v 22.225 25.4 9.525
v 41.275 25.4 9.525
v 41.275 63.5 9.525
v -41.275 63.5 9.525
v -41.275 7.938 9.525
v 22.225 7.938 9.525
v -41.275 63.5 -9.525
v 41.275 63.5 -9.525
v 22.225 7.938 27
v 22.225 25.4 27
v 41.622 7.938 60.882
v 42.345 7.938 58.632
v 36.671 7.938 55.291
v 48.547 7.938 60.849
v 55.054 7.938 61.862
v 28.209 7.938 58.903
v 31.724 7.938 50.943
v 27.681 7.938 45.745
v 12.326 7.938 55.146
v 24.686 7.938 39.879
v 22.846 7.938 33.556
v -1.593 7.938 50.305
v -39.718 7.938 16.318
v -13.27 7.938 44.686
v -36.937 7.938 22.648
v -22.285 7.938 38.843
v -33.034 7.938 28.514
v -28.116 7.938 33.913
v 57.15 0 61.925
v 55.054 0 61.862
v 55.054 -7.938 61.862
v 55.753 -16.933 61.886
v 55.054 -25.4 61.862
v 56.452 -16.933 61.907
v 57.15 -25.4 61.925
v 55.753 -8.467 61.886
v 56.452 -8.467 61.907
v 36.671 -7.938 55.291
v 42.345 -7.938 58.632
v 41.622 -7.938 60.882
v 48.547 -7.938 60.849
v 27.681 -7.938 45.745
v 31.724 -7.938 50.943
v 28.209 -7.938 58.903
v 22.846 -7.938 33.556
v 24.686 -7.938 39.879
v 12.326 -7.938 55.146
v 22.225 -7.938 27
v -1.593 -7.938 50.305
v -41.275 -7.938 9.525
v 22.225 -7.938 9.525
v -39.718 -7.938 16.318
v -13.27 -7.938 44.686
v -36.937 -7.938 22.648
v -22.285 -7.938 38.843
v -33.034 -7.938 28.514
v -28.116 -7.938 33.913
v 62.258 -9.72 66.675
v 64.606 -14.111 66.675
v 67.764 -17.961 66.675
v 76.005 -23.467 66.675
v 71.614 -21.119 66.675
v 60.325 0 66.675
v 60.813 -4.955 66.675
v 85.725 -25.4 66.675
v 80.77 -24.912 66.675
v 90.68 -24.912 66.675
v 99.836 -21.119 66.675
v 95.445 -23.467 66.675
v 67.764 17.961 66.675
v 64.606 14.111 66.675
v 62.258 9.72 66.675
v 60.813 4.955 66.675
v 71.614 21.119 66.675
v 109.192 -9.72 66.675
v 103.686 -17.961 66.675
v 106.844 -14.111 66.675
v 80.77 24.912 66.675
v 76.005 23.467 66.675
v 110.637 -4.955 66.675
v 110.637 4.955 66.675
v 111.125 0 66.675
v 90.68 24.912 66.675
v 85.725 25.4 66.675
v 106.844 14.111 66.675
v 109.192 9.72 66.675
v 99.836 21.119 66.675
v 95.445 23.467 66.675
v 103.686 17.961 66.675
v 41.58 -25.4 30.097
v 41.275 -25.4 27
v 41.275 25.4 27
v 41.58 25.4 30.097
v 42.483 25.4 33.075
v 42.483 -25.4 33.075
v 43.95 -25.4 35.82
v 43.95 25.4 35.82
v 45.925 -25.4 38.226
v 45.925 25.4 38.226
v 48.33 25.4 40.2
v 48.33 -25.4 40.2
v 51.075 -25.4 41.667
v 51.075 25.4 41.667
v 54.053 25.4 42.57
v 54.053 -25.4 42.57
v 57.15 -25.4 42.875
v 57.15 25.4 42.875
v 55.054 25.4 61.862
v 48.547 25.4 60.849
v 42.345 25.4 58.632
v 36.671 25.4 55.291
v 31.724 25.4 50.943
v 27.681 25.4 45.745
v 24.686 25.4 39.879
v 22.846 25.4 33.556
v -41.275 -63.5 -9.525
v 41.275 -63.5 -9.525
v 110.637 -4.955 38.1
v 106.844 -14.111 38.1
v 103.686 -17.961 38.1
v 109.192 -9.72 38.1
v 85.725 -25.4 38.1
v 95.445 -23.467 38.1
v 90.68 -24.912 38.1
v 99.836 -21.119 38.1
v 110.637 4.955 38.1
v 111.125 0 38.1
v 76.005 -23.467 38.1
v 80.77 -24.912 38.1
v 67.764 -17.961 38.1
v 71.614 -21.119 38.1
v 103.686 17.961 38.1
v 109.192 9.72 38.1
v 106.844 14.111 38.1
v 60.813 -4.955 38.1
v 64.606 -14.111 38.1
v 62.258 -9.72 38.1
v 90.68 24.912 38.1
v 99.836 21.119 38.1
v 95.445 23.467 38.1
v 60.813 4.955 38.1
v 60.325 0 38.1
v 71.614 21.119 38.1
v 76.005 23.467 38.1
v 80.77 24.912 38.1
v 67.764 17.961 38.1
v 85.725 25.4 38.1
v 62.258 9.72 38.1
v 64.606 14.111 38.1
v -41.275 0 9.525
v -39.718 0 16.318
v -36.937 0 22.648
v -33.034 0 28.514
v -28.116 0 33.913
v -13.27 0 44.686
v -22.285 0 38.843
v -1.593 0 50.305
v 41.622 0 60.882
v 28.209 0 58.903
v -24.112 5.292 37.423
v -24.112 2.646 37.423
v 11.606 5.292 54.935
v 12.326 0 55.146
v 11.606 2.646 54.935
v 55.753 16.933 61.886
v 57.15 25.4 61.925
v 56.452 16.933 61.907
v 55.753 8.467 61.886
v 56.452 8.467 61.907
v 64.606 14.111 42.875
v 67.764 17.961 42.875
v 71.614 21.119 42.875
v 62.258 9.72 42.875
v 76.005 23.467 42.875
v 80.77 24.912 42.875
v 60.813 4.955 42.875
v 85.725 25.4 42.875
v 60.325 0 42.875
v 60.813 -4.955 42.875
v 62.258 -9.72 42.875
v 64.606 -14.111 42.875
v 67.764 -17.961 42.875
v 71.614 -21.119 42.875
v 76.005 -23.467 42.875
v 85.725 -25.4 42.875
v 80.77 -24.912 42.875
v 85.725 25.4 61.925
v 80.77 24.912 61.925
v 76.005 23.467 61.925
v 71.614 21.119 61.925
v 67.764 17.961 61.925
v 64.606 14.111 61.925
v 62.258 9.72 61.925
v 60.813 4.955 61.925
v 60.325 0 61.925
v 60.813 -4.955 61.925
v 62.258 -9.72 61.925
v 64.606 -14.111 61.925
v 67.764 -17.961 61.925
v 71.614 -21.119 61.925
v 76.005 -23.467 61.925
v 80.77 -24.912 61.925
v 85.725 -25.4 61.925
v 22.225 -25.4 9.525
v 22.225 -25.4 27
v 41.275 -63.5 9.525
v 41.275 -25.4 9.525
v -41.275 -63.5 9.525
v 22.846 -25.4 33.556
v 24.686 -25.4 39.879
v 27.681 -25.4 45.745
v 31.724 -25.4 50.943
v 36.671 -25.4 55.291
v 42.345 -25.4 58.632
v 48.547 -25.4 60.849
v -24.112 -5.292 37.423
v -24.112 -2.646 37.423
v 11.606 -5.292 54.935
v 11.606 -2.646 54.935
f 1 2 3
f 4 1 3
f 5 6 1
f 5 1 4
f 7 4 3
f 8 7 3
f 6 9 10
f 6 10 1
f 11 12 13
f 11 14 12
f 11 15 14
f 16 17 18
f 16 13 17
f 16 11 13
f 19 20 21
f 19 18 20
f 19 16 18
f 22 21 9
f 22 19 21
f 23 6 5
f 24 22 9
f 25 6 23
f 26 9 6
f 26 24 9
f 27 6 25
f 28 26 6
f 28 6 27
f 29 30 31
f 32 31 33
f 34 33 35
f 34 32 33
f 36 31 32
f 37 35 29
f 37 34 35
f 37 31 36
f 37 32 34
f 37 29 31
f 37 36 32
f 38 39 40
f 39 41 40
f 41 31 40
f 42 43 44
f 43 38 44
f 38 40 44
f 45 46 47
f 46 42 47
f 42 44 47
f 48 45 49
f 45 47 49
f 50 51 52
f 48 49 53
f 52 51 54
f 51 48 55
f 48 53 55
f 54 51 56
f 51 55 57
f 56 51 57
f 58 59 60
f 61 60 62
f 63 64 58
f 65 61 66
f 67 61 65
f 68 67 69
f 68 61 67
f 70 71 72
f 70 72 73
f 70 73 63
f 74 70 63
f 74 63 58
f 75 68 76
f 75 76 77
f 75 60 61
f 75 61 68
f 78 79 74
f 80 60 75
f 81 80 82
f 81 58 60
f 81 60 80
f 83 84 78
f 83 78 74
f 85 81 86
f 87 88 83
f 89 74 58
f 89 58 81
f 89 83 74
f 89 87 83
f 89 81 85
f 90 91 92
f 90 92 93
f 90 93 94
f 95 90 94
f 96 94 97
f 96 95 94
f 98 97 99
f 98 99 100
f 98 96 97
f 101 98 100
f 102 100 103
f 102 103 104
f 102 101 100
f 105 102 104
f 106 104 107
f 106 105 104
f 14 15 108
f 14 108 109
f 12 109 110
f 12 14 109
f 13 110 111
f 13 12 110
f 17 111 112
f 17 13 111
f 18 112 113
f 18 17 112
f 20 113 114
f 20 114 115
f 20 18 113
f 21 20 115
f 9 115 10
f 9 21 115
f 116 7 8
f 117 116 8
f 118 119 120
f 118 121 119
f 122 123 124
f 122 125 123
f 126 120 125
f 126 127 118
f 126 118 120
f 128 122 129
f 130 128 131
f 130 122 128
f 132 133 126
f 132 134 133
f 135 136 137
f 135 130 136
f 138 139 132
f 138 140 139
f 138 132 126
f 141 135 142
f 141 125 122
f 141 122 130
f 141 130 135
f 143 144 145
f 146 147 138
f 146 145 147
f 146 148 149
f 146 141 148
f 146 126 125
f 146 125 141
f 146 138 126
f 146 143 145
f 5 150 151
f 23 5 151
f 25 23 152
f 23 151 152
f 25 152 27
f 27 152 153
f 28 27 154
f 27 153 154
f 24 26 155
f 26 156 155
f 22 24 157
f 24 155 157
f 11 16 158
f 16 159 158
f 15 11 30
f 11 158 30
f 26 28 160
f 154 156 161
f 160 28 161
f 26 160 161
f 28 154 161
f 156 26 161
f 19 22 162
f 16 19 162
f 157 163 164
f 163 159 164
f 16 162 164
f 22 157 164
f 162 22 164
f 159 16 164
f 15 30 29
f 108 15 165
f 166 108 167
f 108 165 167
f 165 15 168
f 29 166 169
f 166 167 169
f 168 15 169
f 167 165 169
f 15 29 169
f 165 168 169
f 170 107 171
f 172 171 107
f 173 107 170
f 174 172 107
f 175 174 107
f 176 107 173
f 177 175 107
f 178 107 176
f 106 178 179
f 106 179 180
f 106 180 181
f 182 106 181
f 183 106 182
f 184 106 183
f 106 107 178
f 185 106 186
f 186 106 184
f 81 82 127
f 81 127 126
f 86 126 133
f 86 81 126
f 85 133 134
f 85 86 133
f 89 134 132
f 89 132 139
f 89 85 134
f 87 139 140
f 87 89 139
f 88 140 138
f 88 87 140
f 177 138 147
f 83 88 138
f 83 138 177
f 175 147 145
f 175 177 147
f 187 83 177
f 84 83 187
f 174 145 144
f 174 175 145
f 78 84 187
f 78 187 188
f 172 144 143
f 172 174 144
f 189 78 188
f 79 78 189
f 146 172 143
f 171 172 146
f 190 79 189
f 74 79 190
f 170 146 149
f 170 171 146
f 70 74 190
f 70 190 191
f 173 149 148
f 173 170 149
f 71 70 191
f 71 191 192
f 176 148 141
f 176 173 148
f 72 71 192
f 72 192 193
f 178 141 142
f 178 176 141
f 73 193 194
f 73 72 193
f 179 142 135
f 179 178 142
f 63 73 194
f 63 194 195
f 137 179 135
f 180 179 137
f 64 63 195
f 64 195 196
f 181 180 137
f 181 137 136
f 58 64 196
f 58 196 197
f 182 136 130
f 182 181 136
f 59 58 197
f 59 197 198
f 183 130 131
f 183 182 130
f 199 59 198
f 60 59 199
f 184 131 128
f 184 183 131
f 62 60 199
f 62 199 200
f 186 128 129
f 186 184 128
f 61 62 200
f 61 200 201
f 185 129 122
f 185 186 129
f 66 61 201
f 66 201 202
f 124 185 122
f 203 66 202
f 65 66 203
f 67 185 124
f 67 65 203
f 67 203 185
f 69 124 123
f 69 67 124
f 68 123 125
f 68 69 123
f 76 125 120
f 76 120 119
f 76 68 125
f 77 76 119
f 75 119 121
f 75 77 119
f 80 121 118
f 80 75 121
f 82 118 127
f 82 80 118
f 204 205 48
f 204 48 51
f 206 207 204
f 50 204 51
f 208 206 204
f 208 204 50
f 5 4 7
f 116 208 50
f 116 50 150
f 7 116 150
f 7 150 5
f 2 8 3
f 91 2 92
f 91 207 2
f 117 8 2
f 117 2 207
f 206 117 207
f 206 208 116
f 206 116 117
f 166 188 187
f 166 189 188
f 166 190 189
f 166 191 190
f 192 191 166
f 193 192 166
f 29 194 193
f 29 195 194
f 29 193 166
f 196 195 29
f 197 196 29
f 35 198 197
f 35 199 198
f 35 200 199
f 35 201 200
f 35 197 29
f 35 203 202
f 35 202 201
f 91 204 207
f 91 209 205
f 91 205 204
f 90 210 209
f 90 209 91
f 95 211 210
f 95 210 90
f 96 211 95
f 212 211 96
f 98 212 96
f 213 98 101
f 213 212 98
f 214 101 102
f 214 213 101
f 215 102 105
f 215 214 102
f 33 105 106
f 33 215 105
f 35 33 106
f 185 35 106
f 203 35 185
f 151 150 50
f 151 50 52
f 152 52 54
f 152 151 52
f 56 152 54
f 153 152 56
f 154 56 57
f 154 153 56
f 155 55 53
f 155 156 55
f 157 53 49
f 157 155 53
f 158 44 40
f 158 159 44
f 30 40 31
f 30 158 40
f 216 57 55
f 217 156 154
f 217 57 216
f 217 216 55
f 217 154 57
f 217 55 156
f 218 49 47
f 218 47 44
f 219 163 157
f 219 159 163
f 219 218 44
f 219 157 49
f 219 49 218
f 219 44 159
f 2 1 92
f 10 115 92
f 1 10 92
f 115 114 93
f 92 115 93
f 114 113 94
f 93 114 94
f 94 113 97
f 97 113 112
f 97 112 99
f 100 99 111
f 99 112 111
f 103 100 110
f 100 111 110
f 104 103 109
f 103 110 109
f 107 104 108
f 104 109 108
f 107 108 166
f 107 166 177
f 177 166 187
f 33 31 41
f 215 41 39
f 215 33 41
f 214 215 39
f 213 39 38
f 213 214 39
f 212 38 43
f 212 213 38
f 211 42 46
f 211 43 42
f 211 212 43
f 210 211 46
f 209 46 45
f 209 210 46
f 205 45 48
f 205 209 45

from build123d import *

# Parameters (mm, degrees)
F1_DEPTH = 63.5
F2_W     = 25.4
F2_H     = 19.05
F3_DEPTH = 25.4
F5_DEPTH = 7.9375


with BuildPart() as f1:
    # F0 (on Front) → F1 (new body, symmetric)
    with BuildSketch(Plane.XZ):
        Polygon((-41.275, 9.525), (-41.275, -9.525), (41.275, -9.525), (41.275, 9.525), (22.225, 9.525), align=None)
    extrude(amount=F1_DEPTH, both=True)

    # F2 (on face) + F0 (on Front) → F3 (join, symmetric)
    with BuildSketch(Plane.XZ):
        with Locations((73.025, 52.4002)):
            Rectangle(F2_W, F2_H)
    with BuildSketch(Plane.XZ):
        with BuildLine():
            Line((22.225, 9.525), (41.275, 9.525))
            Line((41.275, 9.525), (41.275, 27.0002))
            ThreePointArc((41.275, 27.0002), (45.9246798487, 38.2255201513), (57.15, 42.8752))
            Line((57.15, 42.8752), (60.325, 42.8752))
            Line((60.325, 42.8752), (60.325, 61.9252))
            Line((60.325, 61.9252), (57.15, 61.9252))
            add(Edge.make_bspline(
                [(55.0536793092, 61.8622289794), (55.7537102916, 61.8873697965), (56.452550575, 61.9083613576), (57.15, 61.9252)],
                knots=[109.7467015362, 109.7467015362, 109.7467015362, 109.7467015362, 111.5045361635, 111.5045361635, 111.5045361635, 111.5045361635], degree=3))
            ThreePointArc((55.0536793092, 61.8622289794), (31.7239343869, 50.9432744149), (22.225, 27.0002))
            Line((22.225, 27.0002), (22.225, 9.525))
        make_face()
    extrude(amount=F3_DEPTH, both=True)

    # F0 (on Front) → F5 (join, symmetric)
    with BuildSketch(Plane.XZ):
        with BuildLine():
            add(Edge.make_bspline(
                [(-41.275, 9.525), (-36.9974255187, 42.549756512), (11.3487197513, 60.2926150292), (55.0536793092, 61.8622289794)],
                knots=[0, 0, 0, 0, 109.7467015362, 109.7467015362, 109.7467015362, 109.7467015362], degree=3))
            Line((-41.275, 9.525), (22.225, 9.525))
            Line((22.225, 9.525), (22.225, 27.0002))
            ThreePointArc((22.225, 27.0002), (31.7239343869, 50.9432744149), (55.0536793092, 61.8622289794))
        make_face()
    extrude(amount=F5_DEPTH, both=True)

    # F6 (on face) → F7 (revolve)
    with BuildSketch(Plane.XZ):
        Polygon((111.125, 66.675), (85.725, 66.675), (85.725, 61.9252), (85.725, 42.8752), (85.725, 38.1), (111.125, 38.1), align=None)
    revolve(axis=Axis((85.725, 0, 52.3875), (0, 0, 1)))


solid = f1.part
